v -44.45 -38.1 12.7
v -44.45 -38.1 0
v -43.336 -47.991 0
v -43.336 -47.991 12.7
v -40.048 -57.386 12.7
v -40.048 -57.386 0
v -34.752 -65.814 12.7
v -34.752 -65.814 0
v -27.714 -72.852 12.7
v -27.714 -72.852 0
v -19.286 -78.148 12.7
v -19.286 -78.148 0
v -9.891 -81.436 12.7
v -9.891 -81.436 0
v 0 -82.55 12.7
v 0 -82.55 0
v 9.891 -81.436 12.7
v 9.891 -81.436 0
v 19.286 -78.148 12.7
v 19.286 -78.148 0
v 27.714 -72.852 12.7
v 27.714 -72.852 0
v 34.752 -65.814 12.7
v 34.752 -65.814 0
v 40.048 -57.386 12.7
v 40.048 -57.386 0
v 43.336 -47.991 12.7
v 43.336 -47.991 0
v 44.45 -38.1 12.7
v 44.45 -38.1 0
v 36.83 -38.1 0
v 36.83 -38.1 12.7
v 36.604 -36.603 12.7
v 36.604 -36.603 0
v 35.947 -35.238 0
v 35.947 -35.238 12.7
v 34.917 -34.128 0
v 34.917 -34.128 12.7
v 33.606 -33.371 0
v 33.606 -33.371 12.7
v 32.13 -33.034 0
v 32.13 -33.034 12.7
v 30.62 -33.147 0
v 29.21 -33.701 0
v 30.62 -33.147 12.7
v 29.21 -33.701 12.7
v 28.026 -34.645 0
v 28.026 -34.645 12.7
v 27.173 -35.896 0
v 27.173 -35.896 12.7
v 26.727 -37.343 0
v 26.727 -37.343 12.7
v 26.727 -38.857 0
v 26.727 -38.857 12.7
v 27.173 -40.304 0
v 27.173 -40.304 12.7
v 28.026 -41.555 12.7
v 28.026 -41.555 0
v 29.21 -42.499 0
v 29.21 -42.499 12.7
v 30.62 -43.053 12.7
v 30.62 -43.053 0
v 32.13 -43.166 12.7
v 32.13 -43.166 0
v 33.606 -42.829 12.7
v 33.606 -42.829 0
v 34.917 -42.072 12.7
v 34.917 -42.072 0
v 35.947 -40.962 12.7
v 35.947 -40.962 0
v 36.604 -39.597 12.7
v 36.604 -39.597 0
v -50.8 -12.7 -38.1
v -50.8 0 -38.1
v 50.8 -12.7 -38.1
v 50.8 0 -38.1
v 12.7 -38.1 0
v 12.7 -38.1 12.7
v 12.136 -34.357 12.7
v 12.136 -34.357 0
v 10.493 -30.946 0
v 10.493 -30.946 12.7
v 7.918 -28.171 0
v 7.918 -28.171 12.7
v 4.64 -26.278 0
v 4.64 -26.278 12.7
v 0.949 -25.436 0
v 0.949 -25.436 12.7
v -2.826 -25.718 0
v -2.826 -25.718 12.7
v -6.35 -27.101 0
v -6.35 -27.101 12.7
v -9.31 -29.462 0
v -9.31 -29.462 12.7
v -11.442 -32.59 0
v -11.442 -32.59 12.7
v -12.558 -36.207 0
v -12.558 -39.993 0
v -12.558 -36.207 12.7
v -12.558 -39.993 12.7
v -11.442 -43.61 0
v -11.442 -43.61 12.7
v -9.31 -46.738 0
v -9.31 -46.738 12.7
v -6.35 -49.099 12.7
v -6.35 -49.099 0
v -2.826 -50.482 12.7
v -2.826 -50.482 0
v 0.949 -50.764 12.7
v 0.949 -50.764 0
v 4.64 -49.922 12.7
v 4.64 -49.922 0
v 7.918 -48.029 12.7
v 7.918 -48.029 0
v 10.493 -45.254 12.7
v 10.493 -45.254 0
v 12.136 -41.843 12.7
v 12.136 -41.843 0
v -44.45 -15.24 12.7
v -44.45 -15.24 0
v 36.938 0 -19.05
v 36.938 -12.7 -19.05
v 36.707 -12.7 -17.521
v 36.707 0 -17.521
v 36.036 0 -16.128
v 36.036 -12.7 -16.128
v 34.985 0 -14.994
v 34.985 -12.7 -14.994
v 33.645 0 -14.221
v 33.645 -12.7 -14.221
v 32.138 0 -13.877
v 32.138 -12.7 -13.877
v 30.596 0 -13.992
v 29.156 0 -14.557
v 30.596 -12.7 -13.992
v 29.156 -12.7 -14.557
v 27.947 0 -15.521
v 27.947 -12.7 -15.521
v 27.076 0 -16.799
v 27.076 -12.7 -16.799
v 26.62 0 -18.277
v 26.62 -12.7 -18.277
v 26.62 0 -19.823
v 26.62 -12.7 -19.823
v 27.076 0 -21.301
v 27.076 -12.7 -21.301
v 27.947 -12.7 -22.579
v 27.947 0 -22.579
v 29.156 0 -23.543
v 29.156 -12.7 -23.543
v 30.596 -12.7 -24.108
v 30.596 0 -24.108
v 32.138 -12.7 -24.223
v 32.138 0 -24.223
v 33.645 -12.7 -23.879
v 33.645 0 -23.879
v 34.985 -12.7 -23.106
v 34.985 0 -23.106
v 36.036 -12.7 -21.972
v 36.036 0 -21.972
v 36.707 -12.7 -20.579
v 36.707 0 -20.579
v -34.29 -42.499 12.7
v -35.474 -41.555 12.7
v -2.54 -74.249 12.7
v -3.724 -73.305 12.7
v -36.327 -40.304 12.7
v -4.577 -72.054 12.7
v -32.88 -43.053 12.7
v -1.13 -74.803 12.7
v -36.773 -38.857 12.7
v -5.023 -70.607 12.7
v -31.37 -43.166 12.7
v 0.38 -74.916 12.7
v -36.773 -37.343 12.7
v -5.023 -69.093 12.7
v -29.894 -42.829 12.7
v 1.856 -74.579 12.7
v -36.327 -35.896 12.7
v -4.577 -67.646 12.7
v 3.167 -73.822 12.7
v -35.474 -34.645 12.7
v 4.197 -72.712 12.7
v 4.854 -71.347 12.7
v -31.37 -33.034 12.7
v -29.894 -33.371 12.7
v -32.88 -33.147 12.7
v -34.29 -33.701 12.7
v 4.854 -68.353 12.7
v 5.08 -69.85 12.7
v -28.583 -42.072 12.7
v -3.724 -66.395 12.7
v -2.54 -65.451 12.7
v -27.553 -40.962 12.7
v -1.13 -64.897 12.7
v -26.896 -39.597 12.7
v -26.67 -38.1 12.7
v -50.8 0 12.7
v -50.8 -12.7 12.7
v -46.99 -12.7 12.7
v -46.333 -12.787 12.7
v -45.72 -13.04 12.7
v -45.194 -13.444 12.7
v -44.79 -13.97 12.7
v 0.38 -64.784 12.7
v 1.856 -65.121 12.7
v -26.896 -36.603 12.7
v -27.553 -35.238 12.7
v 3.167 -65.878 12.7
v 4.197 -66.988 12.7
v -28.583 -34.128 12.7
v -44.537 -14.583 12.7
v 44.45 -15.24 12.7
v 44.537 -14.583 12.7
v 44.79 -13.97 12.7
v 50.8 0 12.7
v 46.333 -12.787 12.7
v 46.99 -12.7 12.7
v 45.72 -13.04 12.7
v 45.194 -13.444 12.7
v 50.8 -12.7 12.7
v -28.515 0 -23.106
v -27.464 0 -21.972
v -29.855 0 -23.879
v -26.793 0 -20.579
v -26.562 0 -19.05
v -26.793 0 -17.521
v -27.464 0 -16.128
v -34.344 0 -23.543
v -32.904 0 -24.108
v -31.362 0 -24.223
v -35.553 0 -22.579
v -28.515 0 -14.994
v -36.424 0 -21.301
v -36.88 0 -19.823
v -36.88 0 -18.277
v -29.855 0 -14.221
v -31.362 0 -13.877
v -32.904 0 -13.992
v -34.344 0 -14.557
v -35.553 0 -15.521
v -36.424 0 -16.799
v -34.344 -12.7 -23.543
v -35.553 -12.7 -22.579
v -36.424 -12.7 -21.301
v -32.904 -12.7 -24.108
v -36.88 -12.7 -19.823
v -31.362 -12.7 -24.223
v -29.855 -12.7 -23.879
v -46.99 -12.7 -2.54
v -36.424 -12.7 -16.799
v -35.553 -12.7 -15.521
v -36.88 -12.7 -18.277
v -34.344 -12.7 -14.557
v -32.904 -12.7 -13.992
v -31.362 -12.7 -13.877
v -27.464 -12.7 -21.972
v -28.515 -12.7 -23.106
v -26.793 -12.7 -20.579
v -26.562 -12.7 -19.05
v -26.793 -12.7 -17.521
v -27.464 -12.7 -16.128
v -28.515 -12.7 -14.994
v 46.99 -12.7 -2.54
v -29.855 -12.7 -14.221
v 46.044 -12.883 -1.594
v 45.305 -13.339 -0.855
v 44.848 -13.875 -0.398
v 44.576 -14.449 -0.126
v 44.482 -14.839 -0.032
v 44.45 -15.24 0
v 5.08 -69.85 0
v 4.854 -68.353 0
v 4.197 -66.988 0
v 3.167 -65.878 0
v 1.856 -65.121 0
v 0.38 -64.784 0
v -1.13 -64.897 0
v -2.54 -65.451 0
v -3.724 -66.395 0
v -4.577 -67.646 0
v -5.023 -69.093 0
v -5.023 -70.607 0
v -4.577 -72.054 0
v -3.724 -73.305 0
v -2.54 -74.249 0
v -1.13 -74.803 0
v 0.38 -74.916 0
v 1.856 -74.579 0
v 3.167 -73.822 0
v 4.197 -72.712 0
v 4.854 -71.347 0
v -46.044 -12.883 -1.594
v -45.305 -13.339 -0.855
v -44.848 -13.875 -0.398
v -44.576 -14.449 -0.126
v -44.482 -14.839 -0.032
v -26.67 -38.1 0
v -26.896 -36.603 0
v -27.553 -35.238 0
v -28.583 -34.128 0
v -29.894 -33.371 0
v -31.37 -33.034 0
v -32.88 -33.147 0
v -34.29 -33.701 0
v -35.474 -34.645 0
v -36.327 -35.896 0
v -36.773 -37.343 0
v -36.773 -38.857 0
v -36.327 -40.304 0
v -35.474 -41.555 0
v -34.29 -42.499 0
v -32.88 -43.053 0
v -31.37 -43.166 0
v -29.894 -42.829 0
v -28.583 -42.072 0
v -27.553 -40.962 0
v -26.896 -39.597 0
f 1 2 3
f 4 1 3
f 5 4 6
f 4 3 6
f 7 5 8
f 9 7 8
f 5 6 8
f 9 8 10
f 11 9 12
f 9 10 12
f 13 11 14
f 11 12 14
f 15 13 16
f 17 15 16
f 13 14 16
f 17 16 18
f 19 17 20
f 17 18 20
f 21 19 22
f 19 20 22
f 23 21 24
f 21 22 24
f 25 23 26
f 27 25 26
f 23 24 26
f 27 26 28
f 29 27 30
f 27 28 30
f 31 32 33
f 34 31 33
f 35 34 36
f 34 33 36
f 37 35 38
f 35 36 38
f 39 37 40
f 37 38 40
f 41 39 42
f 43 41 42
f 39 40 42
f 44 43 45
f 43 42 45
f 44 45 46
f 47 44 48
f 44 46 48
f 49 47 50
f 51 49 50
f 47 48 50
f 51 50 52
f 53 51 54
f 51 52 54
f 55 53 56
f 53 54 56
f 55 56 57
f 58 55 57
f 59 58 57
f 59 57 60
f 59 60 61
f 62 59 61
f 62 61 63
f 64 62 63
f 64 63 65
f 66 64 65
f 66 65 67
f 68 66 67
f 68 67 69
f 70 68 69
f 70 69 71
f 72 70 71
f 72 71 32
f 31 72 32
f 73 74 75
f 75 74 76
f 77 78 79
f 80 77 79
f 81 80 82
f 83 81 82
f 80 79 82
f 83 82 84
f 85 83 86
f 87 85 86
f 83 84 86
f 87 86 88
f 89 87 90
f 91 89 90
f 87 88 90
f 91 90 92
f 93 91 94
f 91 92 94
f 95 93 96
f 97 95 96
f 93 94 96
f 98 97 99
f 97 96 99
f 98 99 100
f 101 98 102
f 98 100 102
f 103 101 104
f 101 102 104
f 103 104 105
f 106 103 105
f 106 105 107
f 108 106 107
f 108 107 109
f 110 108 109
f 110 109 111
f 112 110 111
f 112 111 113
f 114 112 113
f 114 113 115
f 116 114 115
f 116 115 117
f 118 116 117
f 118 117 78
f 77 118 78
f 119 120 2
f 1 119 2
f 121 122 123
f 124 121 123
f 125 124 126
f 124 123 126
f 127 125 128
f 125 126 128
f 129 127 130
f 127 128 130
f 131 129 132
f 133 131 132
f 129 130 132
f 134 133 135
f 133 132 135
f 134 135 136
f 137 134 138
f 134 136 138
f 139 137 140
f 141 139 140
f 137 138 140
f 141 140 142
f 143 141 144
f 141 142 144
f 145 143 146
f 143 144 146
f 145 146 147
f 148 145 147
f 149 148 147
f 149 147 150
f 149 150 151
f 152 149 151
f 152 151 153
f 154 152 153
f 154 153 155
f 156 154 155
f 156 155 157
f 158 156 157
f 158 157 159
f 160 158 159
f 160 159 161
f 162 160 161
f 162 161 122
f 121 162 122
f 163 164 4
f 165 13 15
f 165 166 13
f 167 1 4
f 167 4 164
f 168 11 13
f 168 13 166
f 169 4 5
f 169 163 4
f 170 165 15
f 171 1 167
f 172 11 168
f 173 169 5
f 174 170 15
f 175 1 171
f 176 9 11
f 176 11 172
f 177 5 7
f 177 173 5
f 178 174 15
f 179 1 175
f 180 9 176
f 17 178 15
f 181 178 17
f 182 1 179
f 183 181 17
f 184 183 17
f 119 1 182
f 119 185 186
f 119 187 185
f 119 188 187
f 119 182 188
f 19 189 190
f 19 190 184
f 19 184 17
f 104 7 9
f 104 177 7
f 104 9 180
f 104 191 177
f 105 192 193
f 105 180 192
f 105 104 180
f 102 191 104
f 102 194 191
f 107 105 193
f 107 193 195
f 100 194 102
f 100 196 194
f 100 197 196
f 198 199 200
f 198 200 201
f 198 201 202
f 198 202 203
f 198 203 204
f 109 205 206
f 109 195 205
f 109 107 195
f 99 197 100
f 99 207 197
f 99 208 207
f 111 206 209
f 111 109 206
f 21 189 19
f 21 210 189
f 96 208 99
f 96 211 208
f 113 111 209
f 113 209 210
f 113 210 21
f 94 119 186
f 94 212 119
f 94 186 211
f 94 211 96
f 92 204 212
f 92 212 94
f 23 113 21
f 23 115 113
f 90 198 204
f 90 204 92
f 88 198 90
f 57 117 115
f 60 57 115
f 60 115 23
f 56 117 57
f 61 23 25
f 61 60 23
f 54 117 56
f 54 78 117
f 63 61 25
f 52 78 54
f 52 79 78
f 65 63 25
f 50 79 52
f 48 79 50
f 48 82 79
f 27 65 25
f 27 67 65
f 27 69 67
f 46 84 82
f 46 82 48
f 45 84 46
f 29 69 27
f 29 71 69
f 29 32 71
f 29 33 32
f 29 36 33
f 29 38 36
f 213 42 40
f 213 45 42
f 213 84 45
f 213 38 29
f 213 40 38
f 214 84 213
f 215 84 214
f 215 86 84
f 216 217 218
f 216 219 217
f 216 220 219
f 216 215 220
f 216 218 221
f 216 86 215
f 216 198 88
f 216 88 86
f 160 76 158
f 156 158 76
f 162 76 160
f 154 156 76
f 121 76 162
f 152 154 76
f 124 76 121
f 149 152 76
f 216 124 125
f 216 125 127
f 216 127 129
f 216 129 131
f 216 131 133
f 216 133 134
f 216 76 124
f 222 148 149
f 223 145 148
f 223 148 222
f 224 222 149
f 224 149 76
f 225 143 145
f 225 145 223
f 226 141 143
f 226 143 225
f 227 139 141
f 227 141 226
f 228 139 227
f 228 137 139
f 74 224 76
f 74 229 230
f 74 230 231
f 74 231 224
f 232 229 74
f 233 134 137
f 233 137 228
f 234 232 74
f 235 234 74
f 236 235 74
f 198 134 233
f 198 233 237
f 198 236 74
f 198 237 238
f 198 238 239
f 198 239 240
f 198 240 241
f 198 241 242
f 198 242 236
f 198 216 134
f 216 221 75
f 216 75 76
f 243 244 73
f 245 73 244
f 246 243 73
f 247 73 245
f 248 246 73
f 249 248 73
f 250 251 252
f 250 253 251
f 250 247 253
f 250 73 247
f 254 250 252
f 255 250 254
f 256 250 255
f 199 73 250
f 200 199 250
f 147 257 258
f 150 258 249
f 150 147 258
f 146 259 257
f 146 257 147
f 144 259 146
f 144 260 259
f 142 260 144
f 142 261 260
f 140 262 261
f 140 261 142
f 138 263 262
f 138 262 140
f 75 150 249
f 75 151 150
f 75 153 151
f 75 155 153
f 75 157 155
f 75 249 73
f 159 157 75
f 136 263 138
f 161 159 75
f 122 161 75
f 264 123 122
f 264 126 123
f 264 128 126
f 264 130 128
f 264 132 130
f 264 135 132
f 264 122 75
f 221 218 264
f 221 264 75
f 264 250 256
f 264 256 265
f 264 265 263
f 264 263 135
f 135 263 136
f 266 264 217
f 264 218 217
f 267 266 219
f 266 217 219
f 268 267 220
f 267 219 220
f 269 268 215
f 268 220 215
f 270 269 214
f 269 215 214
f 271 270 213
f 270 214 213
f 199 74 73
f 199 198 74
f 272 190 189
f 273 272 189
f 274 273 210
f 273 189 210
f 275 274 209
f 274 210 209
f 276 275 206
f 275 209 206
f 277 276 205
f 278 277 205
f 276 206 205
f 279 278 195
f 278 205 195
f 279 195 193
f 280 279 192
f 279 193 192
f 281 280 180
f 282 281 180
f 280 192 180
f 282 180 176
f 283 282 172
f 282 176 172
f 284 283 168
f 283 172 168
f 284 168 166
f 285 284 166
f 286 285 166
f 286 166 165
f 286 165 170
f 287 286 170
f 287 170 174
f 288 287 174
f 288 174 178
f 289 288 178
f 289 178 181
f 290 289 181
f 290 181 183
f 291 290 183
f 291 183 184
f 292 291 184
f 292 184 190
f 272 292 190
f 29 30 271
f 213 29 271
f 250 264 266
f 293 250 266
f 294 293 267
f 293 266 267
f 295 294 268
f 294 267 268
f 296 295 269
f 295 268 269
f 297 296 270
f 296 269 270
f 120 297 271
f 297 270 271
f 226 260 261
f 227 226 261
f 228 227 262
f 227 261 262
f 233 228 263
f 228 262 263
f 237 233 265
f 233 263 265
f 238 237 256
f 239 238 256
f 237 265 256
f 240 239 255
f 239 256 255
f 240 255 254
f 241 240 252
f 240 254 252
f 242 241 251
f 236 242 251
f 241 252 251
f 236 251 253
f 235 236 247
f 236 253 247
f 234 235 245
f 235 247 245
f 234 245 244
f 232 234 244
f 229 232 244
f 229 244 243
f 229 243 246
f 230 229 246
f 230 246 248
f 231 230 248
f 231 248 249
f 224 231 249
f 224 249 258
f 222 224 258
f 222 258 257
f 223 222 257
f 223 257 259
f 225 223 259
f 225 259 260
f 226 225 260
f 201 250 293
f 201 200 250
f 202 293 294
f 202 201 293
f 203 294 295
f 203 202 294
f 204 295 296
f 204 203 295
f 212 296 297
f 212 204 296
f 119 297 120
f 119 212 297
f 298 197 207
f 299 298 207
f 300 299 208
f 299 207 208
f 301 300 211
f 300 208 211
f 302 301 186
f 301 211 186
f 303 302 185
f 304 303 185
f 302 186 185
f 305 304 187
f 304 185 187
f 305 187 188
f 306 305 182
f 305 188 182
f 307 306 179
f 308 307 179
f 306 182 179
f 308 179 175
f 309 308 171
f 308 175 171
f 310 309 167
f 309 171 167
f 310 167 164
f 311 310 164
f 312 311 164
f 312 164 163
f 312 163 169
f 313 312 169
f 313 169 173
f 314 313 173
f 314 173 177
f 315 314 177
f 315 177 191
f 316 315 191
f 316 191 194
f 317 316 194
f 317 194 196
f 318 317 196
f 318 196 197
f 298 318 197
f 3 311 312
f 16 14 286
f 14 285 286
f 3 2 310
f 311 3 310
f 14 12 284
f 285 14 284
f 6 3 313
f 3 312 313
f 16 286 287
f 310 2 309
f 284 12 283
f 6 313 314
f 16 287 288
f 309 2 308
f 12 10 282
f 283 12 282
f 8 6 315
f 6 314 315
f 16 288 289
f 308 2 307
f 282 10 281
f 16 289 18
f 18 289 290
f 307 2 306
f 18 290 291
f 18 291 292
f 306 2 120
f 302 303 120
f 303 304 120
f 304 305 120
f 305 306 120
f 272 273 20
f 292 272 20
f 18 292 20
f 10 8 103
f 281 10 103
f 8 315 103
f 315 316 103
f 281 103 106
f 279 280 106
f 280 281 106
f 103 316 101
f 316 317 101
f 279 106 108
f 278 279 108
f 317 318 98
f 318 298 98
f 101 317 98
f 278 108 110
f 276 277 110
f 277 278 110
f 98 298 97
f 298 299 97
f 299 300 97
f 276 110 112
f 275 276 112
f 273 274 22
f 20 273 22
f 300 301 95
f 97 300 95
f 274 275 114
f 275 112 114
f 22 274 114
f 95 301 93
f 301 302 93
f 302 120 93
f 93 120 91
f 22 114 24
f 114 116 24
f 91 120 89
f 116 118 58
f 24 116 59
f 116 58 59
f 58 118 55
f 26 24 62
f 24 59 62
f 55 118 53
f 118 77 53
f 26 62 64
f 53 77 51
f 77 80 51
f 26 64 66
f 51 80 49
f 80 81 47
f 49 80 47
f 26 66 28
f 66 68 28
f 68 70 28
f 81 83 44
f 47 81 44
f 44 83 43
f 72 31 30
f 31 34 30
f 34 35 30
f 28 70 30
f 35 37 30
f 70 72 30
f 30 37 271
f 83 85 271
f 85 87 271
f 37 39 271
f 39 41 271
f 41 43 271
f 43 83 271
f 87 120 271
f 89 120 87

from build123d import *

# Parameters (mm, degrees)
BOSS_EXTRUDE1_DEPTH = 12.7
BOSS_EXTRUDE2_DEPTH = 38.1
SKETCH4_R           = 12.7
SKETCH4_R_2         = 5.08
CUT_EXTRUDE1_DEPTH  = 110.433918417
SKETCH3_R           = 5.18795
CUT_EXTRUDE2_DEPTH  = 95.399536545
FILLET1_R           = 2.54


with BuildPart() as part:
    # Sketch1 → Boss-Extrude1 (new body)
    with BuildSketch(Plane.XY):
        with BuildLine():
            Line((50.8, -12.7), (50.8, 0))
            Line((50.8, 0), (-50.8, 0))
            Line((-50.8, 0), (-50.8, -12.7))
            Line((-50.8, -12.7), (-44.45, -12.7))
            Line((-44.45, -12.7), (-44.45, -38.1))
            ThreePointArc((-44.45, -38.1), (0, -82.55), (44.45, -38.1))
            Line((44.45, -38.1), (44.45, -12.7))
            Line((44.45, -12.7), (50.8, -12.7))
        make_face()
    extrude(amount=BOSS_EXTRUDE1_DEPTH)

    # Sketch1<4> → Boss-Extrude2 (add)
    with BuildSketch(Plane.XY):
        Polygon((50.8, -12.7), (50.8, 0), (-50.8, 0), (-50.8, -12.7), (-44.45, -12.7), (44.45, -12.7), align=None)
    extrude(amount=-BOSS_EXTRUDE2_DEPTH)

    # Sketch4 → Cut-Extrude1 (cut, through all)
    with BuildSketch(Plane.XY.offset(12.7)):
        with Locations((0, -38.1)):
            Circle(SKETCH4_R)
        with Locations((-31.75, -38.1)):
            Circle(SKETCH4_R_2)
        with Locations((31.75, -38.1)):
            Circle(SKETCH4_R_2)
        with Locations((0, -69.85)):
            Circle(SKETCH4_R_2)
    extrude(amount=-CUT_EXTRUDE1_DEPTH, mode=Mode.SUBTRACT)

    # Sketch3 → Cut-Extrude2 (cut, through all)
    with BuildSketch(Plane.XZ.offset(12.7)):
        with Locations((-31.75, -19.05)):
            Circle(SKETCH3_R)
        with Locations((31.75, -19.05)):
            Circle(SKETCH3_R)
    extrude(amount=-CUT_EXTRUDE2_DEPTH, mode=Mode.SUBTRACT)

    # Fillet1
    fillet1_edges = [part.edges().sort_by_distance(p)[0] for p in [
        (0, -12.7, 0),
        (44.45, -12.7, 6.35),
        (-44.45, -12.7, 6.35),
    ]]
    fillet(fillet1_edges, radius=FILLET1_R)


solid = part.part
